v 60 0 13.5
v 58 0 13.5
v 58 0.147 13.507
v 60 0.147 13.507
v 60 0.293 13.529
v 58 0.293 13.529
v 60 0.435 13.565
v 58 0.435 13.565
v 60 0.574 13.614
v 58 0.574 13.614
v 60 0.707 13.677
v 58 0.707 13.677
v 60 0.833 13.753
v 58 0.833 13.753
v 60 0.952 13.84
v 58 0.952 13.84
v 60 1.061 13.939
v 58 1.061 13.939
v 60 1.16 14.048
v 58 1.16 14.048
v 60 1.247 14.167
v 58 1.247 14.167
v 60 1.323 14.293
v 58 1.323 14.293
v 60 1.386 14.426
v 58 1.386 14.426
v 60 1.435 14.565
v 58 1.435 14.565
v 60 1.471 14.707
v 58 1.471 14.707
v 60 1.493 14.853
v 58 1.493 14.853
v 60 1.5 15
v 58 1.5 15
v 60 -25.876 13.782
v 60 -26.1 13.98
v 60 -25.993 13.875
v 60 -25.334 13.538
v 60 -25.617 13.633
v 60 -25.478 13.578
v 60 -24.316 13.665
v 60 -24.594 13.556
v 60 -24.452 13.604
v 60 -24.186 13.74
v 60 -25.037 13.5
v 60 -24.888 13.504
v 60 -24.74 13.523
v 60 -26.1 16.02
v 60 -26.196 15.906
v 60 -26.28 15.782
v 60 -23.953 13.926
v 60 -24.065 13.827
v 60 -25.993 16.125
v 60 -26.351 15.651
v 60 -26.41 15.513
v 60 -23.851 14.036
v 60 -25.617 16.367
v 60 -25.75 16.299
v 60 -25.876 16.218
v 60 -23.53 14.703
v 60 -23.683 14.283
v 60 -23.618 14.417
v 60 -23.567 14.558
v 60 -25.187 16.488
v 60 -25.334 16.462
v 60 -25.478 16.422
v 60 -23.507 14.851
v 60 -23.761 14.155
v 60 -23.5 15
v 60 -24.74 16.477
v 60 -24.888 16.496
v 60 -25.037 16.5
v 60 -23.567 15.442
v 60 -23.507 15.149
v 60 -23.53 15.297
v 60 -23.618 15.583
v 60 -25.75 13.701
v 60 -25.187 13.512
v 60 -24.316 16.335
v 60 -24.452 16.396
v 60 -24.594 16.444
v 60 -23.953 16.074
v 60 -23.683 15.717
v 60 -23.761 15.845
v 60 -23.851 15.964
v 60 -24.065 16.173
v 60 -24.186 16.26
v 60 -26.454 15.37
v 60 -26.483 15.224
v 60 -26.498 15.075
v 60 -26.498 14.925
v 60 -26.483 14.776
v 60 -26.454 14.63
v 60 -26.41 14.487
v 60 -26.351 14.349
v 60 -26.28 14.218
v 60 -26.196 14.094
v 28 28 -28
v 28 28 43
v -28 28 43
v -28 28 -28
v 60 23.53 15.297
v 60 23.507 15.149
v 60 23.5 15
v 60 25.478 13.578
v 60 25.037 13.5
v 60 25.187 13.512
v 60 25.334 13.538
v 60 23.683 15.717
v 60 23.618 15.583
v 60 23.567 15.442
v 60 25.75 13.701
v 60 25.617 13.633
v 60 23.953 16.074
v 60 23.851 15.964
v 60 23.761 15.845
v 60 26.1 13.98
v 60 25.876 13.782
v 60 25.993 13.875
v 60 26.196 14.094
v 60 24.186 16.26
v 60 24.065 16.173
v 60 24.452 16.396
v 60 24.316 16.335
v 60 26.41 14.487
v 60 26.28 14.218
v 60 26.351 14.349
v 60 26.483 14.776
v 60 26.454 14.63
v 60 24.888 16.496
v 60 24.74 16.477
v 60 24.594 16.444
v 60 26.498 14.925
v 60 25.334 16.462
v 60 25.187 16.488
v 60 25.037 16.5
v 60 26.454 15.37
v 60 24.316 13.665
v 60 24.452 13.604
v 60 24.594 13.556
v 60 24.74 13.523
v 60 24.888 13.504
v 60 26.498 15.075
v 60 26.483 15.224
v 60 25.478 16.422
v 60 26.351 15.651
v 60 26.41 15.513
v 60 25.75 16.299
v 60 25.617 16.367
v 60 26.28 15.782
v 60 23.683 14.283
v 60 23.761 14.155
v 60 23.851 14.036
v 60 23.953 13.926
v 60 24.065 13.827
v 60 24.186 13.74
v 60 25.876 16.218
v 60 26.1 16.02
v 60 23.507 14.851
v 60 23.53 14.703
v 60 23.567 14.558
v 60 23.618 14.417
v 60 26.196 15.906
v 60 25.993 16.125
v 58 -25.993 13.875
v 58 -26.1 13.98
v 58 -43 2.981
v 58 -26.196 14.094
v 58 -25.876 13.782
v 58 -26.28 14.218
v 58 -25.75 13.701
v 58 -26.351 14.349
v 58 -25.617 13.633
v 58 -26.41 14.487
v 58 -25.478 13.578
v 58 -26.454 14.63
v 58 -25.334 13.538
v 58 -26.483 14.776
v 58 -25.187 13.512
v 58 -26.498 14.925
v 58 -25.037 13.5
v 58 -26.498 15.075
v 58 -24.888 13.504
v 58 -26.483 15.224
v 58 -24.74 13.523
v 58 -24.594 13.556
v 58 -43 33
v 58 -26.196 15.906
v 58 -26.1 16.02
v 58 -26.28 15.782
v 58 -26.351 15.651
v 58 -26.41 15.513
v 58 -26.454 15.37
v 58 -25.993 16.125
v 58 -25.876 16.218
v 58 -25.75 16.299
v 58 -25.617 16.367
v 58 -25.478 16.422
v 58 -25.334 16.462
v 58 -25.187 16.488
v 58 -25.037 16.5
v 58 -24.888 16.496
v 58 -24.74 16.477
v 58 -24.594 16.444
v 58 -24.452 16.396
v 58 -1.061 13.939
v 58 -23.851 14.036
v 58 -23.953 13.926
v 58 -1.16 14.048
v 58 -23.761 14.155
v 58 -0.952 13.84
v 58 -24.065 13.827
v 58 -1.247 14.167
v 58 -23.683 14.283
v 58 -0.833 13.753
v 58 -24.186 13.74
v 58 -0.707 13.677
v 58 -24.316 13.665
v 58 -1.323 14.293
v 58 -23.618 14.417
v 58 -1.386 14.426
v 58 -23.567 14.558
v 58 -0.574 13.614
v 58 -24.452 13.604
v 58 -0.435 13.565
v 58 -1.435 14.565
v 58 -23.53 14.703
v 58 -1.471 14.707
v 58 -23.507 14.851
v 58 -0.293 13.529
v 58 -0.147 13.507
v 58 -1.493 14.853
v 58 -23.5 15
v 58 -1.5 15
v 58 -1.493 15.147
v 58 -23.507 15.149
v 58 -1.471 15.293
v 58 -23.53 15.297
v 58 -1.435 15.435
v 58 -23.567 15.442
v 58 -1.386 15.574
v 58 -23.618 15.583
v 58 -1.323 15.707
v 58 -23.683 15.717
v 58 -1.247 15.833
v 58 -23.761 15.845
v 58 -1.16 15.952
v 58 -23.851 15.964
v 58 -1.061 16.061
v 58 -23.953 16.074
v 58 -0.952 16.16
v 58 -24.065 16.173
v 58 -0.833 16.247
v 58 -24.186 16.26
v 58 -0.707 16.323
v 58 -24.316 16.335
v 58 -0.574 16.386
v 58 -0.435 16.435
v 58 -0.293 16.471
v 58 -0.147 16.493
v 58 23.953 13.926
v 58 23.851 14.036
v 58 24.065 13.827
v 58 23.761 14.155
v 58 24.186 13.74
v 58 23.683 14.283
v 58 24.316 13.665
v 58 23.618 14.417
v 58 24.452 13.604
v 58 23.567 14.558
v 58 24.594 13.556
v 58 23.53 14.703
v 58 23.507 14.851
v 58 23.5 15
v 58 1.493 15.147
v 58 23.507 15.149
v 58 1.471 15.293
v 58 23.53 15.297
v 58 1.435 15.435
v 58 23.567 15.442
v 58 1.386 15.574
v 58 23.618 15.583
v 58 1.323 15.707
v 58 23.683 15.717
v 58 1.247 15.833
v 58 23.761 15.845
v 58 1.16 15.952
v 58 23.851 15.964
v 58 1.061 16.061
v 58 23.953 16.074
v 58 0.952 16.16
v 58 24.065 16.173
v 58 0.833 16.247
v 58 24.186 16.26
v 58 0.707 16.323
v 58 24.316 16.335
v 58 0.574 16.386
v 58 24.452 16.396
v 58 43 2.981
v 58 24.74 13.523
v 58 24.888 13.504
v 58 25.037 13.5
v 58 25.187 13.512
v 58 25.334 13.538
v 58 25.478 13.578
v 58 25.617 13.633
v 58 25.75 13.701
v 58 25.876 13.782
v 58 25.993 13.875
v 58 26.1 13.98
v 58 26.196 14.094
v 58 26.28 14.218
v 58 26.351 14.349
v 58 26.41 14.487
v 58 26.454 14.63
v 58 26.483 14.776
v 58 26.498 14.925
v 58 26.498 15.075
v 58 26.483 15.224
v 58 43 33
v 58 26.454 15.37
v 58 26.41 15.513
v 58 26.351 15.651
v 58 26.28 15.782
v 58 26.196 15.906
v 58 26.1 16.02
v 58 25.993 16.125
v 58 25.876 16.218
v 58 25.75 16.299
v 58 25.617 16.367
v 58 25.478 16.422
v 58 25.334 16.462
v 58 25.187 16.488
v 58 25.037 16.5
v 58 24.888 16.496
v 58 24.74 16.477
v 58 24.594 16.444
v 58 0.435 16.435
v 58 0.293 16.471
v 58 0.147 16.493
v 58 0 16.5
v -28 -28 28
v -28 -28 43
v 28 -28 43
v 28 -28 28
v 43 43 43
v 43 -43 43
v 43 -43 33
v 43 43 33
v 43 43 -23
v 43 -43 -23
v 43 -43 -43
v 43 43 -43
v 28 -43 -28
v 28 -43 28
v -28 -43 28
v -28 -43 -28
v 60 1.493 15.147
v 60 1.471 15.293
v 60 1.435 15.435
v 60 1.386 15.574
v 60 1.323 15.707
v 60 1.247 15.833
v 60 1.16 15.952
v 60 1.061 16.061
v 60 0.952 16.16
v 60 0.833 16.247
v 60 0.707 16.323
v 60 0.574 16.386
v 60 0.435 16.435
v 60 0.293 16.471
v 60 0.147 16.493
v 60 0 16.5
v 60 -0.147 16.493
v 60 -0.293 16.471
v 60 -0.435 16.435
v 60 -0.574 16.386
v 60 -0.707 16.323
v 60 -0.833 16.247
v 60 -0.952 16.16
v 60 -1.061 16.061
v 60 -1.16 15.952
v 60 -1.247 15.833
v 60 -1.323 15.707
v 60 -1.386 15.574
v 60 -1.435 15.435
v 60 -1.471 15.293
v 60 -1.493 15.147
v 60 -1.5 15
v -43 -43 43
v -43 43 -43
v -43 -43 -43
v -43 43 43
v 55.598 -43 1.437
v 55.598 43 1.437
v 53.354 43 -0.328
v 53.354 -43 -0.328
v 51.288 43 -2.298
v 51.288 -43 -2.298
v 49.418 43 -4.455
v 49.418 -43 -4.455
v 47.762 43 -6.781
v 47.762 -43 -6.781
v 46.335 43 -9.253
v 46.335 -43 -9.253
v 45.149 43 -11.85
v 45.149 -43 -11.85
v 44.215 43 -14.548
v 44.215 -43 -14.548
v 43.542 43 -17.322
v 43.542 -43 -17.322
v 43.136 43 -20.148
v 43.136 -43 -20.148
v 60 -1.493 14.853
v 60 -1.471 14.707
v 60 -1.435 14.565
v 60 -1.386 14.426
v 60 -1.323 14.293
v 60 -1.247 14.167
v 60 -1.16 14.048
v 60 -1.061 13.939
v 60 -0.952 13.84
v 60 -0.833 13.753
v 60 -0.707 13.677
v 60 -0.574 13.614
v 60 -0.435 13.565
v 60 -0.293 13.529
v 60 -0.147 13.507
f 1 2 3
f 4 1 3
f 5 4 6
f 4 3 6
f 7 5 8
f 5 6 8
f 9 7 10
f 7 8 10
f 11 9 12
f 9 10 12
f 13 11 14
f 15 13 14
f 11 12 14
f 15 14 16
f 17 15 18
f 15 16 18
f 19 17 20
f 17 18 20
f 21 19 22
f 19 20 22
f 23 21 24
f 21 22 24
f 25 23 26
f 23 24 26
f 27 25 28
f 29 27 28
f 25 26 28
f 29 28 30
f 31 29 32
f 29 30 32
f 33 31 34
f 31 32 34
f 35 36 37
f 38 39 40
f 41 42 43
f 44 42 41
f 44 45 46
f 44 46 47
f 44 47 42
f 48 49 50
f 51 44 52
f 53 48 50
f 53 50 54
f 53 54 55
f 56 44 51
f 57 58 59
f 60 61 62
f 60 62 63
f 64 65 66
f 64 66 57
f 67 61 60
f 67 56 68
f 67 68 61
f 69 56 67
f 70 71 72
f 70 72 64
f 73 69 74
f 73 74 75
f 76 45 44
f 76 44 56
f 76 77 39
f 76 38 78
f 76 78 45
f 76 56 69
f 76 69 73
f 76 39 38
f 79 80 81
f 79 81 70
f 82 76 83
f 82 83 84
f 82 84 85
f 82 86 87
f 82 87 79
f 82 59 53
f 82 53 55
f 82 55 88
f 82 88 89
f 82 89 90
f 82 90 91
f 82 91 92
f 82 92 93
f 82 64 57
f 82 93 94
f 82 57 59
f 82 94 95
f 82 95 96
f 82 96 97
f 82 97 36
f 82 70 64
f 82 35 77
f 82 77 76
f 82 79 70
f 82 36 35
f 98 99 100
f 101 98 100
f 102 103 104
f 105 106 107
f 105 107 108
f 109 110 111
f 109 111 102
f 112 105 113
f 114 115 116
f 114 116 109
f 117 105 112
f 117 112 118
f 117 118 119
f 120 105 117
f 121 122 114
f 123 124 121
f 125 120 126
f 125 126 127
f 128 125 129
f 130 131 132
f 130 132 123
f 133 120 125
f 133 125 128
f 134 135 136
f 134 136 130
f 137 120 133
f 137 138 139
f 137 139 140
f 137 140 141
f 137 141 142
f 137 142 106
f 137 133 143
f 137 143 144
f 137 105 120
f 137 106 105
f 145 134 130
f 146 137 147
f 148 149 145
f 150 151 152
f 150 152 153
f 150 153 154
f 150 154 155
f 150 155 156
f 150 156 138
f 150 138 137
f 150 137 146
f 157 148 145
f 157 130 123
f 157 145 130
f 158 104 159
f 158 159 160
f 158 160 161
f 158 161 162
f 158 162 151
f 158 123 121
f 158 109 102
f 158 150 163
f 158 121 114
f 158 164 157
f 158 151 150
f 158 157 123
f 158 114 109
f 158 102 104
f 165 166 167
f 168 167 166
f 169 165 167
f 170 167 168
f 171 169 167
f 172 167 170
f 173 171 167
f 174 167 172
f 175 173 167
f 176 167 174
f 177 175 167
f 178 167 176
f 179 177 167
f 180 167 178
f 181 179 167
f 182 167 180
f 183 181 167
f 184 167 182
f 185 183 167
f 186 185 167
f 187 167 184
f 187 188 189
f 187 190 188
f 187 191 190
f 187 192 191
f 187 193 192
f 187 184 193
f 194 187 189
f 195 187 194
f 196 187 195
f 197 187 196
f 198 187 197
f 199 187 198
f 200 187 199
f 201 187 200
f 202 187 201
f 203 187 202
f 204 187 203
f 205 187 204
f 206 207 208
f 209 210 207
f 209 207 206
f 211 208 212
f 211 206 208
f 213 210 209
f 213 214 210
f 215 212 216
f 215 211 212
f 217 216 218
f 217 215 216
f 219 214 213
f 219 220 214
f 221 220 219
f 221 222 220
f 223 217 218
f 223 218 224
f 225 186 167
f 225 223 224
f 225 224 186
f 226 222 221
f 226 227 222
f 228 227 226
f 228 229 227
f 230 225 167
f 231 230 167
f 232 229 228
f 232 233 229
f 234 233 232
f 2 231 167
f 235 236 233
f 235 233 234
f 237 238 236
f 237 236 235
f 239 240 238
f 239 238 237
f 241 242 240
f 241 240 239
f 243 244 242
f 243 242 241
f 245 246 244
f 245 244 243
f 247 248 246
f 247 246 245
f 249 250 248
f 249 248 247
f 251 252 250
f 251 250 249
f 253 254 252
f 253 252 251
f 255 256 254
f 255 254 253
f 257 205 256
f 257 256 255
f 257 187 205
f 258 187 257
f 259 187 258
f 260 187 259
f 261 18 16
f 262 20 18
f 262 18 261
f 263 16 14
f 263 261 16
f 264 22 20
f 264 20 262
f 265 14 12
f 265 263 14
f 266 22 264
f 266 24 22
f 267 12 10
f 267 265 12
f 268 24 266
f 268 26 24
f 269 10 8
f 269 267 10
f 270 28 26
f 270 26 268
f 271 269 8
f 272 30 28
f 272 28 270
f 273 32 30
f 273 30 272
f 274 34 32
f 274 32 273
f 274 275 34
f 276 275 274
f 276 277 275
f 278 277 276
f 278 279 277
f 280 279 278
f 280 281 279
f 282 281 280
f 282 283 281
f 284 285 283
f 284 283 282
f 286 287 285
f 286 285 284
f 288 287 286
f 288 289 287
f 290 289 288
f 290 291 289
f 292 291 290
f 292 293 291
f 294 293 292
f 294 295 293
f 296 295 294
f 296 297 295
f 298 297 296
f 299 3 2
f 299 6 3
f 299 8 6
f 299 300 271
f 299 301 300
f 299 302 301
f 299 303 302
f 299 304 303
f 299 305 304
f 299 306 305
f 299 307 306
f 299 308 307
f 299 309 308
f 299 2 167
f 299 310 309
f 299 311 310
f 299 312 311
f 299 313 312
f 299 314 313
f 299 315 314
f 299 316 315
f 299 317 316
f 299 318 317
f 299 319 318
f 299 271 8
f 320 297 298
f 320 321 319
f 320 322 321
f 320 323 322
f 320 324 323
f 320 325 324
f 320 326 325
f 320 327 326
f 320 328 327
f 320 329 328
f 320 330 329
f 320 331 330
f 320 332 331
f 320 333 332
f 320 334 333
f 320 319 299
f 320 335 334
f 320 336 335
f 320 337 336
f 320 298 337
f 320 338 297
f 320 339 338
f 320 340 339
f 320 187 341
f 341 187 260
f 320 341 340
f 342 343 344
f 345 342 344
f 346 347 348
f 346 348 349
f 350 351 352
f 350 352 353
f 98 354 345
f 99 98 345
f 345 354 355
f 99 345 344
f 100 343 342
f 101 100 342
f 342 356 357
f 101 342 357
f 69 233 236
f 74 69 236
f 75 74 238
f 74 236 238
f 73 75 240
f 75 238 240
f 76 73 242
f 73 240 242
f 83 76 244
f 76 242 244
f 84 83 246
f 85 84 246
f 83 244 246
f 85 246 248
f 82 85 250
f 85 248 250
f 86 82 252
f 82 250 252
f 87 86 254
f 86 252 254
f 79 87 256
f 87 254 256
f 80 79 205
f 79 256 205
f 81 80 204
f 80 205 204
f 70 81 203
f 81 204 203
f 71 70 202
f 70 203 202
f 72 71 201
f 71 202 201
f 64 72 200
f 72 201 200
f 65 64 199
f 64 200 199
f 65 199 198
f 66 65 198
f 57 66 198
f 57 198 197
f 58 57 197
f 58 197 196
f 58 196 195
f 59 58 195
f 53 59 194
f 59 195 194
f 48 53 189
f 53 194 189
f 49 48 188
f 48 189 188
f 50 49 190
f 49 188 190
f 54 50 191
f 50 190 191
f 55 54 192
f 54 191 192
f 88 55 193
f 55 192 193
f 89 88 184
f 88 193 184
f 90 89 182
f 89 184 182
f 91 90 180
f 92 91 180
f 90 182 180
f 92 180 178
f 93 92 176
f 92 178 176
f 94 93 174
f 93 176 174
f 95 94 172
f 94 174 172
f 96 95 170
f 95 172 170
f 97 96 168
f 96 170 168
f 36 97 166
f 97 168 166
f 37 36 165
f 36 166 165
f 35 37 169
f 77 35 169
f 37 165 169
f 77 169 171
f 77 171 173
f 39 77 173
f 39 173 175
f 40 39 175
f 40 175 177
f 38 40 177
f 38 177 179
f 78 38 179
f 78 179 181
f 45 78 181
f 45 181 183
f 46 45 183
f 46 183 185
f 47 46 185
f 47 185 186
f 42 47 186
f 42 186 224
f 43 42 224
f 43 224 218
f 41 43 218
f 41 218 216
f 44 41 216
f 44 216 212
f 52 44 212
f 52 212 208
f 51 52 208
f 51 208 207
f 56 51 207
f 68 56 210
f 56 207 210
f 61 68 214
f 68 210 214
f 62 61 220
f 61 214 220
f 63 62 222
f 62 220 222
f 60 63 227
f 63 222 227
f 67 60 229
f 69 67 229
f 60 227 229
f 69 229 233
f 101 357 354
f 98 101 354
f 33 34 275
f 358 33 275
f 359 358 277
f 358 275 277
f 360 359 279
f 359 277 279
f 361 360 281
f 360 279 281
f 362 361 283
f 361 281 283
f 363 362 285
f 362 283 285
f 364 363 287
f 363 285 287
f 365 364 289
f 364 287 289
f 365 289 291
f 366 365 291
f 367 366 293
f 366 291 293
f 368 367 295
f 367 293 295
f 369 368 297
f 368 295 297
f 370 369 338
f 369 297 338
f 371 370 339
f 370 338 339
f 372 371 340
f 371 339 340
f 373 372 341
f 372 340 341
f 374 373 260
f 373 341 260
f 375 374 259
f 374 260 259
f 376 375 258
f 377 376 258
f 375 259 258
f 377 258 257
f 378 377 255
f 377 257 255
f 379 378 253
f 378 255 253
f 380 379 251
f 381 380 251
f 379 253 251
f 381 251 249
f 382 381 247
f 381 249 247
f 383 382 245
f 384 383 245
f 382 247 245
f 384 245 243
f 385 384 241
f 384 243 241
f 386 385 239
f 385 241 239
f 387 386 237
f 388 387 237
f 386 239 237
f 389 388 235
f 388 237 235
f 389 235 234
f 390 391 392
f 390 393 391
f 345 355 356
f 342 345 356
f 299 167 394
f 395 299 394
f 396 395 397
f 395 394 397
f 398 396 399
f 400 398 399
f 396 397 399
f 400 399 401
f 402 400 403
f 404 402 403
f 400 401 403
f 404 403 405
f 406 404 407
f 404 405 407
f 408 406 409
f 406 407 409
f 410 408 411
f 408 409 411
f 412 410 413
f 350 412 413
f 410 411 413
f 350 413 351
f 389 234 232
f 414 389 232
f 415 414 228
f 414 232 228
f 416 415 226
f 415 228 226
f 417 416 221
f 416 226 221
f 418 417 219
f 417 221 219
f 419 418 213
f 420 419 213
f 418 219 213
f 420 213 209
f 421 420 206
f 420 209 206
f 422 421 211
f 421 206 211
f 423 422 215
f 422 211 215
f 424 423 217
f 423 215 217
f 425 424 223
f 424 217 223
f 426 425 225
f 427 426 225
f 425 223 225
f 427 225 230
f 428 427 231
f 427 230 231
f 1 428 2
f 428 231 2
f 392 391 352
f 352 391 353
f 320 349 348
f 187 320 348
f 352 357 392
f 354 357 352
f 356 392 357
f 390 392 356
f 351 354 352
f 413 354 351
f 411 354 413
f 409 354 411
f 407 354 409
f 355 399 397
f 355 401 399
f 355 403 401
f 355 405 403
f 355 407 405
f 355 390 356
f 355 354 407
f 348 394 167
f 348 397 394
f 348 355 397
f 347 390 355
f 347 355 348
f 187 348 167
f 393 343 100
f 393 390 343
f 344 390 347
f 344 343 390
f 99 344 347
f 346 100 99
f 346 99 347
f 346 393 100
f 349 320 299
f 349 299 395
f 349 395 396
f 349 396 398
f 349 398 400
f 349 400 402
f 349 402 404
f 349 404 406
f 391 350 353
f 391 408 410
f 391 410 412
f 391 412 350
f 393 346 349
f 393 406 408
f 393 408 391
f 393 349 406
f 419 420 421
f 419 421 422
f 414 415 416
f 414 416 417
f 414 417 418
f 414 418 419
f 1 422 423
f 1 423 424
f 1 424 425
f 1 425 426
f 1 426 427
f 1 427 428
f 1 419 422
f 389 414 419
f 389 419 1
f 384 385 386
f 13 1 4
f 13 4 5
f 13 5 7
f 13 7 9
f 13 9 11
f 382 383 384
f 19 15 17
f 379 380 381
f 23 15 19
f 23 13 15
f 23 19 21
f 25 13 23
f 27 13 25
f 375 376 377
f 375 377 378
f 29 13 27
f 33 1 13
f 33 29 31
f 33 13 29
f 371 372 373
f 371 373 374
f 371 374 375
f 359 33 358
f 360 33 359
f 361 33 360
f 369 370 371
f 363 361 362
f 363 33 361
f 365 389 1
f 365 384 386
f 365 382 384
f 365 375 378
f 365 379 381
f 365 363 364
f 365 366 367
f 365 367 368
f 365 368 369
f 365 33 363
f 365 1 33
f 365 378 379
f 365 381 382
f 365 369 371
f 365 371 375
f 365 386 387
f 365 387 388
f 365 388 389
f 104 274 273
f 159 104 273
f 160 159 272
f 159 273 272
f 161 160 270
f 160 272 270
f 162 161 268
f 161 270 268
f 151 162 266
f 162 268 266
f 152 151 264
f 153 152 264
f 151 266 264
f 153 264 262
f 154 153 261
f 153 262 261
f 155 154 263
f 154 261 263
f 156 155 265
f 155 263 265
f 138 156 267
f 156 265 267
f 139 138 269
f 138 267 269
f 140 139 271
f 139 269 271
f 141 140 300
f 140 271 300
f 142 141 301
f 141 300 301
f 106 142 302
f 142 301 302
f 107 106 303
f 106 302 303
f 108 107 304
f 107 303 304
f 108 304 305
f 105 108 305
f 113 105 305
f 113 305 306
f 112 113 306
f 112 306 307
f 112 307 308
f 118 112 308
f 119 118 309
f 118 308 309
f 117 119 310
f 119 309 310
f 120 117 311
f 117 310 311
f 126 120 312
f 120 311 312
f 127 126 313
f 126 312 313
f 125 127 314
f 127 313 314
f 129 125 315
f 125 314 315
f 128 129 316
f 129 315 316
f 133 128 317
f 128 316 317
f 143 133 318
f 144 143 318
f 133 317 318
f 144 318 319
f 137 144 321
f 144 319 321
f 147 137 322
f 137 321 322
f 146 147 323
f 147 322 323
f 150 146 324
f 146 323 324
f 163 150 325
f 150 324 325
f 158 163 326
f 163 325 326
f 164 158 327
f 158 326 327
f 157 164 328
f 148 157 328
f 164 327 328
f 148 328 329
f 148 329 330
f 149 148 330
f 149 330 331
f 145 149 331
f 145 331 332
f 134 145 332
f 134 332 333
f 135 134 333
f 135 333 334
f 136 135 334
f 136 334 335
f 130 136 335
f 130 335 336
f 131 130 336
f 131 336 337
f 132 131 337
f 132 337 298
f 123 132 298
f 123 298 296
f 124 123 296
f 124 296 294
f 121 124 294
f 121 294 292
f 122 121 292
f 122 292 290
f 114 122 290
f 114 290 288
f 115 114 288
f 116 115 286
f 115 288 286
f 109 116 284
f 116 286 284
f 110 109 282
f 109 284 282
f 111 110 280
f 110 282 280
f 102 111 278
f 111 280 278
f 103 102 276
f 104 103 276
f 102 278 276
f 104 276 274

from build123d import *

# Parameters (mm, degrees)
F0_W          = 43
F0_H          = 43
F1_DEPTH      = 43
F1_DEPTH_BACK = 43
F2_W          = 28
F2_H          = 28
F3_DEPTH      = 71
F4_W          = 28
F4_H          = 28
F5_DEPTH      = 71
F7_DEPTH      = 15
F9_DEPTH      = 100
F10_R         = 1.5
F11_DEPTH     = 2


with BuildPart() as f1:
    # F0 (on Top) → F1 (new body, two sides)
    with BuildSketch(Plane.XY) as f1_sk:
        Polygon((0, 43), (0, 0), (-43, 0), (-43, -43), (0, -43), (43, -43), (43, 0), (43, 43), align=None)
        with Locations((-21.5, 21.5)):
            Rectangle(F0_W, F0_H)
    extrude(amount=F1_DEPTH)
    extrude(f1_sk.sketch, amount=-F1_DEPTH_BACK)

    # F2 (on face) → F3 (cut)
    with BuildSketch(Plane.XY.offset(43)):
        with Locations((-14, 14)):
            Rectangle(F2_W, F2_H)
        Polygon((0, 28), (0, 0), (-28, 0), (-28, -28), (0, -28), (28, -28), (28, 0), (28, 28), align=None)
    extrude(amount=-F3_DEPTH, mode=Mode.SUBTRACT)

    # F4 (on face) → F5 (cut)
    with BuildSketch(Plane.XZ.offset(43)):
        with Locations((-14, 14)):
            Rectangle(F4_W, F4_H)
        Polygon((0, 28), (0, 0), (-28, 0), (-28, -28), (0, -28), (28, -28), (28, 0), (28, 28), align=None)
    extrude(amount=-F5_DEPTH, mode=Mode.SUBTRACT)

    # F6 (on face) → F7 (join)
    with BuildSketch(Plane.YZ.offset(43)):
        Polygon((0, -23), (0, 0), (0, 33), (-43, 33), (-43, -23), align=None)
        Polygon((0, 33), (0, 0), (0, -23), (43, -23), (43, 33), align=None)
    extrude(amount=F7_DEPTH)

    # F8 (on face) → F9 (cut)
    with BuildSketch(Plane.XZ.offset(43)):
        with BuildLine():
            Line((68, 7), (68, 6.5803989155))
            ThreePointArc((68, 6.5803989155), (70.4912121916, 6.8949156836), (73, 7))
            Line((73, 7), (68, 7))
        make_face()
        with BuildLine():
            ThreePointArc((58, 2.9807621135), (47.0192378865, -8), (43, -23))
            Line((43, -23), (58, -23))
            Line((58, -23), (58, 2.9807621135))
        make_face()
    extrude(amount=-F9_DEPTH, mode=Mode.SUBTRACT)

    # F10 (on face) → F11 (join)
    with BuildSketch(Plane.YZ.offset(58)):
        with BuildLine():
            ThreePointArc((-1.5, 15), (-1.0606601718, 13.9393398282), (0, 13.5))
            Line((0, 13.5), (0, 15))
            Line((0, 15), (-1.5, 15))
        make_face()
        with BuildLine():
            Line((-1.5, 15), (0, 15))
            Line((0, 15), (1.5, 15))
            ThreePointArc((1.5, 15), (0, 16.5), (-1.5, 15))
        make_face()
        with BuildLine():
            Line((0, 15), (0, 13.5))
            ThreePointArc((0, 13.5), (1.0606601718, 13.9393398282), (1.5, 15))
            Line((1.5, 15), (0, 15))
        make_face()
        with Locations((-25, 15)):
            Circle(F10_R)
        with BuildLine():
            ThreePointArc((26.5, 15), (25, 16.5), (23.5, 15))
            ThreePointArc((23.5, 15), (25, 13.5), (26.5, 15))
        make_face()
    extrude(amount=F11_DEPTH)


solid = f1.part
